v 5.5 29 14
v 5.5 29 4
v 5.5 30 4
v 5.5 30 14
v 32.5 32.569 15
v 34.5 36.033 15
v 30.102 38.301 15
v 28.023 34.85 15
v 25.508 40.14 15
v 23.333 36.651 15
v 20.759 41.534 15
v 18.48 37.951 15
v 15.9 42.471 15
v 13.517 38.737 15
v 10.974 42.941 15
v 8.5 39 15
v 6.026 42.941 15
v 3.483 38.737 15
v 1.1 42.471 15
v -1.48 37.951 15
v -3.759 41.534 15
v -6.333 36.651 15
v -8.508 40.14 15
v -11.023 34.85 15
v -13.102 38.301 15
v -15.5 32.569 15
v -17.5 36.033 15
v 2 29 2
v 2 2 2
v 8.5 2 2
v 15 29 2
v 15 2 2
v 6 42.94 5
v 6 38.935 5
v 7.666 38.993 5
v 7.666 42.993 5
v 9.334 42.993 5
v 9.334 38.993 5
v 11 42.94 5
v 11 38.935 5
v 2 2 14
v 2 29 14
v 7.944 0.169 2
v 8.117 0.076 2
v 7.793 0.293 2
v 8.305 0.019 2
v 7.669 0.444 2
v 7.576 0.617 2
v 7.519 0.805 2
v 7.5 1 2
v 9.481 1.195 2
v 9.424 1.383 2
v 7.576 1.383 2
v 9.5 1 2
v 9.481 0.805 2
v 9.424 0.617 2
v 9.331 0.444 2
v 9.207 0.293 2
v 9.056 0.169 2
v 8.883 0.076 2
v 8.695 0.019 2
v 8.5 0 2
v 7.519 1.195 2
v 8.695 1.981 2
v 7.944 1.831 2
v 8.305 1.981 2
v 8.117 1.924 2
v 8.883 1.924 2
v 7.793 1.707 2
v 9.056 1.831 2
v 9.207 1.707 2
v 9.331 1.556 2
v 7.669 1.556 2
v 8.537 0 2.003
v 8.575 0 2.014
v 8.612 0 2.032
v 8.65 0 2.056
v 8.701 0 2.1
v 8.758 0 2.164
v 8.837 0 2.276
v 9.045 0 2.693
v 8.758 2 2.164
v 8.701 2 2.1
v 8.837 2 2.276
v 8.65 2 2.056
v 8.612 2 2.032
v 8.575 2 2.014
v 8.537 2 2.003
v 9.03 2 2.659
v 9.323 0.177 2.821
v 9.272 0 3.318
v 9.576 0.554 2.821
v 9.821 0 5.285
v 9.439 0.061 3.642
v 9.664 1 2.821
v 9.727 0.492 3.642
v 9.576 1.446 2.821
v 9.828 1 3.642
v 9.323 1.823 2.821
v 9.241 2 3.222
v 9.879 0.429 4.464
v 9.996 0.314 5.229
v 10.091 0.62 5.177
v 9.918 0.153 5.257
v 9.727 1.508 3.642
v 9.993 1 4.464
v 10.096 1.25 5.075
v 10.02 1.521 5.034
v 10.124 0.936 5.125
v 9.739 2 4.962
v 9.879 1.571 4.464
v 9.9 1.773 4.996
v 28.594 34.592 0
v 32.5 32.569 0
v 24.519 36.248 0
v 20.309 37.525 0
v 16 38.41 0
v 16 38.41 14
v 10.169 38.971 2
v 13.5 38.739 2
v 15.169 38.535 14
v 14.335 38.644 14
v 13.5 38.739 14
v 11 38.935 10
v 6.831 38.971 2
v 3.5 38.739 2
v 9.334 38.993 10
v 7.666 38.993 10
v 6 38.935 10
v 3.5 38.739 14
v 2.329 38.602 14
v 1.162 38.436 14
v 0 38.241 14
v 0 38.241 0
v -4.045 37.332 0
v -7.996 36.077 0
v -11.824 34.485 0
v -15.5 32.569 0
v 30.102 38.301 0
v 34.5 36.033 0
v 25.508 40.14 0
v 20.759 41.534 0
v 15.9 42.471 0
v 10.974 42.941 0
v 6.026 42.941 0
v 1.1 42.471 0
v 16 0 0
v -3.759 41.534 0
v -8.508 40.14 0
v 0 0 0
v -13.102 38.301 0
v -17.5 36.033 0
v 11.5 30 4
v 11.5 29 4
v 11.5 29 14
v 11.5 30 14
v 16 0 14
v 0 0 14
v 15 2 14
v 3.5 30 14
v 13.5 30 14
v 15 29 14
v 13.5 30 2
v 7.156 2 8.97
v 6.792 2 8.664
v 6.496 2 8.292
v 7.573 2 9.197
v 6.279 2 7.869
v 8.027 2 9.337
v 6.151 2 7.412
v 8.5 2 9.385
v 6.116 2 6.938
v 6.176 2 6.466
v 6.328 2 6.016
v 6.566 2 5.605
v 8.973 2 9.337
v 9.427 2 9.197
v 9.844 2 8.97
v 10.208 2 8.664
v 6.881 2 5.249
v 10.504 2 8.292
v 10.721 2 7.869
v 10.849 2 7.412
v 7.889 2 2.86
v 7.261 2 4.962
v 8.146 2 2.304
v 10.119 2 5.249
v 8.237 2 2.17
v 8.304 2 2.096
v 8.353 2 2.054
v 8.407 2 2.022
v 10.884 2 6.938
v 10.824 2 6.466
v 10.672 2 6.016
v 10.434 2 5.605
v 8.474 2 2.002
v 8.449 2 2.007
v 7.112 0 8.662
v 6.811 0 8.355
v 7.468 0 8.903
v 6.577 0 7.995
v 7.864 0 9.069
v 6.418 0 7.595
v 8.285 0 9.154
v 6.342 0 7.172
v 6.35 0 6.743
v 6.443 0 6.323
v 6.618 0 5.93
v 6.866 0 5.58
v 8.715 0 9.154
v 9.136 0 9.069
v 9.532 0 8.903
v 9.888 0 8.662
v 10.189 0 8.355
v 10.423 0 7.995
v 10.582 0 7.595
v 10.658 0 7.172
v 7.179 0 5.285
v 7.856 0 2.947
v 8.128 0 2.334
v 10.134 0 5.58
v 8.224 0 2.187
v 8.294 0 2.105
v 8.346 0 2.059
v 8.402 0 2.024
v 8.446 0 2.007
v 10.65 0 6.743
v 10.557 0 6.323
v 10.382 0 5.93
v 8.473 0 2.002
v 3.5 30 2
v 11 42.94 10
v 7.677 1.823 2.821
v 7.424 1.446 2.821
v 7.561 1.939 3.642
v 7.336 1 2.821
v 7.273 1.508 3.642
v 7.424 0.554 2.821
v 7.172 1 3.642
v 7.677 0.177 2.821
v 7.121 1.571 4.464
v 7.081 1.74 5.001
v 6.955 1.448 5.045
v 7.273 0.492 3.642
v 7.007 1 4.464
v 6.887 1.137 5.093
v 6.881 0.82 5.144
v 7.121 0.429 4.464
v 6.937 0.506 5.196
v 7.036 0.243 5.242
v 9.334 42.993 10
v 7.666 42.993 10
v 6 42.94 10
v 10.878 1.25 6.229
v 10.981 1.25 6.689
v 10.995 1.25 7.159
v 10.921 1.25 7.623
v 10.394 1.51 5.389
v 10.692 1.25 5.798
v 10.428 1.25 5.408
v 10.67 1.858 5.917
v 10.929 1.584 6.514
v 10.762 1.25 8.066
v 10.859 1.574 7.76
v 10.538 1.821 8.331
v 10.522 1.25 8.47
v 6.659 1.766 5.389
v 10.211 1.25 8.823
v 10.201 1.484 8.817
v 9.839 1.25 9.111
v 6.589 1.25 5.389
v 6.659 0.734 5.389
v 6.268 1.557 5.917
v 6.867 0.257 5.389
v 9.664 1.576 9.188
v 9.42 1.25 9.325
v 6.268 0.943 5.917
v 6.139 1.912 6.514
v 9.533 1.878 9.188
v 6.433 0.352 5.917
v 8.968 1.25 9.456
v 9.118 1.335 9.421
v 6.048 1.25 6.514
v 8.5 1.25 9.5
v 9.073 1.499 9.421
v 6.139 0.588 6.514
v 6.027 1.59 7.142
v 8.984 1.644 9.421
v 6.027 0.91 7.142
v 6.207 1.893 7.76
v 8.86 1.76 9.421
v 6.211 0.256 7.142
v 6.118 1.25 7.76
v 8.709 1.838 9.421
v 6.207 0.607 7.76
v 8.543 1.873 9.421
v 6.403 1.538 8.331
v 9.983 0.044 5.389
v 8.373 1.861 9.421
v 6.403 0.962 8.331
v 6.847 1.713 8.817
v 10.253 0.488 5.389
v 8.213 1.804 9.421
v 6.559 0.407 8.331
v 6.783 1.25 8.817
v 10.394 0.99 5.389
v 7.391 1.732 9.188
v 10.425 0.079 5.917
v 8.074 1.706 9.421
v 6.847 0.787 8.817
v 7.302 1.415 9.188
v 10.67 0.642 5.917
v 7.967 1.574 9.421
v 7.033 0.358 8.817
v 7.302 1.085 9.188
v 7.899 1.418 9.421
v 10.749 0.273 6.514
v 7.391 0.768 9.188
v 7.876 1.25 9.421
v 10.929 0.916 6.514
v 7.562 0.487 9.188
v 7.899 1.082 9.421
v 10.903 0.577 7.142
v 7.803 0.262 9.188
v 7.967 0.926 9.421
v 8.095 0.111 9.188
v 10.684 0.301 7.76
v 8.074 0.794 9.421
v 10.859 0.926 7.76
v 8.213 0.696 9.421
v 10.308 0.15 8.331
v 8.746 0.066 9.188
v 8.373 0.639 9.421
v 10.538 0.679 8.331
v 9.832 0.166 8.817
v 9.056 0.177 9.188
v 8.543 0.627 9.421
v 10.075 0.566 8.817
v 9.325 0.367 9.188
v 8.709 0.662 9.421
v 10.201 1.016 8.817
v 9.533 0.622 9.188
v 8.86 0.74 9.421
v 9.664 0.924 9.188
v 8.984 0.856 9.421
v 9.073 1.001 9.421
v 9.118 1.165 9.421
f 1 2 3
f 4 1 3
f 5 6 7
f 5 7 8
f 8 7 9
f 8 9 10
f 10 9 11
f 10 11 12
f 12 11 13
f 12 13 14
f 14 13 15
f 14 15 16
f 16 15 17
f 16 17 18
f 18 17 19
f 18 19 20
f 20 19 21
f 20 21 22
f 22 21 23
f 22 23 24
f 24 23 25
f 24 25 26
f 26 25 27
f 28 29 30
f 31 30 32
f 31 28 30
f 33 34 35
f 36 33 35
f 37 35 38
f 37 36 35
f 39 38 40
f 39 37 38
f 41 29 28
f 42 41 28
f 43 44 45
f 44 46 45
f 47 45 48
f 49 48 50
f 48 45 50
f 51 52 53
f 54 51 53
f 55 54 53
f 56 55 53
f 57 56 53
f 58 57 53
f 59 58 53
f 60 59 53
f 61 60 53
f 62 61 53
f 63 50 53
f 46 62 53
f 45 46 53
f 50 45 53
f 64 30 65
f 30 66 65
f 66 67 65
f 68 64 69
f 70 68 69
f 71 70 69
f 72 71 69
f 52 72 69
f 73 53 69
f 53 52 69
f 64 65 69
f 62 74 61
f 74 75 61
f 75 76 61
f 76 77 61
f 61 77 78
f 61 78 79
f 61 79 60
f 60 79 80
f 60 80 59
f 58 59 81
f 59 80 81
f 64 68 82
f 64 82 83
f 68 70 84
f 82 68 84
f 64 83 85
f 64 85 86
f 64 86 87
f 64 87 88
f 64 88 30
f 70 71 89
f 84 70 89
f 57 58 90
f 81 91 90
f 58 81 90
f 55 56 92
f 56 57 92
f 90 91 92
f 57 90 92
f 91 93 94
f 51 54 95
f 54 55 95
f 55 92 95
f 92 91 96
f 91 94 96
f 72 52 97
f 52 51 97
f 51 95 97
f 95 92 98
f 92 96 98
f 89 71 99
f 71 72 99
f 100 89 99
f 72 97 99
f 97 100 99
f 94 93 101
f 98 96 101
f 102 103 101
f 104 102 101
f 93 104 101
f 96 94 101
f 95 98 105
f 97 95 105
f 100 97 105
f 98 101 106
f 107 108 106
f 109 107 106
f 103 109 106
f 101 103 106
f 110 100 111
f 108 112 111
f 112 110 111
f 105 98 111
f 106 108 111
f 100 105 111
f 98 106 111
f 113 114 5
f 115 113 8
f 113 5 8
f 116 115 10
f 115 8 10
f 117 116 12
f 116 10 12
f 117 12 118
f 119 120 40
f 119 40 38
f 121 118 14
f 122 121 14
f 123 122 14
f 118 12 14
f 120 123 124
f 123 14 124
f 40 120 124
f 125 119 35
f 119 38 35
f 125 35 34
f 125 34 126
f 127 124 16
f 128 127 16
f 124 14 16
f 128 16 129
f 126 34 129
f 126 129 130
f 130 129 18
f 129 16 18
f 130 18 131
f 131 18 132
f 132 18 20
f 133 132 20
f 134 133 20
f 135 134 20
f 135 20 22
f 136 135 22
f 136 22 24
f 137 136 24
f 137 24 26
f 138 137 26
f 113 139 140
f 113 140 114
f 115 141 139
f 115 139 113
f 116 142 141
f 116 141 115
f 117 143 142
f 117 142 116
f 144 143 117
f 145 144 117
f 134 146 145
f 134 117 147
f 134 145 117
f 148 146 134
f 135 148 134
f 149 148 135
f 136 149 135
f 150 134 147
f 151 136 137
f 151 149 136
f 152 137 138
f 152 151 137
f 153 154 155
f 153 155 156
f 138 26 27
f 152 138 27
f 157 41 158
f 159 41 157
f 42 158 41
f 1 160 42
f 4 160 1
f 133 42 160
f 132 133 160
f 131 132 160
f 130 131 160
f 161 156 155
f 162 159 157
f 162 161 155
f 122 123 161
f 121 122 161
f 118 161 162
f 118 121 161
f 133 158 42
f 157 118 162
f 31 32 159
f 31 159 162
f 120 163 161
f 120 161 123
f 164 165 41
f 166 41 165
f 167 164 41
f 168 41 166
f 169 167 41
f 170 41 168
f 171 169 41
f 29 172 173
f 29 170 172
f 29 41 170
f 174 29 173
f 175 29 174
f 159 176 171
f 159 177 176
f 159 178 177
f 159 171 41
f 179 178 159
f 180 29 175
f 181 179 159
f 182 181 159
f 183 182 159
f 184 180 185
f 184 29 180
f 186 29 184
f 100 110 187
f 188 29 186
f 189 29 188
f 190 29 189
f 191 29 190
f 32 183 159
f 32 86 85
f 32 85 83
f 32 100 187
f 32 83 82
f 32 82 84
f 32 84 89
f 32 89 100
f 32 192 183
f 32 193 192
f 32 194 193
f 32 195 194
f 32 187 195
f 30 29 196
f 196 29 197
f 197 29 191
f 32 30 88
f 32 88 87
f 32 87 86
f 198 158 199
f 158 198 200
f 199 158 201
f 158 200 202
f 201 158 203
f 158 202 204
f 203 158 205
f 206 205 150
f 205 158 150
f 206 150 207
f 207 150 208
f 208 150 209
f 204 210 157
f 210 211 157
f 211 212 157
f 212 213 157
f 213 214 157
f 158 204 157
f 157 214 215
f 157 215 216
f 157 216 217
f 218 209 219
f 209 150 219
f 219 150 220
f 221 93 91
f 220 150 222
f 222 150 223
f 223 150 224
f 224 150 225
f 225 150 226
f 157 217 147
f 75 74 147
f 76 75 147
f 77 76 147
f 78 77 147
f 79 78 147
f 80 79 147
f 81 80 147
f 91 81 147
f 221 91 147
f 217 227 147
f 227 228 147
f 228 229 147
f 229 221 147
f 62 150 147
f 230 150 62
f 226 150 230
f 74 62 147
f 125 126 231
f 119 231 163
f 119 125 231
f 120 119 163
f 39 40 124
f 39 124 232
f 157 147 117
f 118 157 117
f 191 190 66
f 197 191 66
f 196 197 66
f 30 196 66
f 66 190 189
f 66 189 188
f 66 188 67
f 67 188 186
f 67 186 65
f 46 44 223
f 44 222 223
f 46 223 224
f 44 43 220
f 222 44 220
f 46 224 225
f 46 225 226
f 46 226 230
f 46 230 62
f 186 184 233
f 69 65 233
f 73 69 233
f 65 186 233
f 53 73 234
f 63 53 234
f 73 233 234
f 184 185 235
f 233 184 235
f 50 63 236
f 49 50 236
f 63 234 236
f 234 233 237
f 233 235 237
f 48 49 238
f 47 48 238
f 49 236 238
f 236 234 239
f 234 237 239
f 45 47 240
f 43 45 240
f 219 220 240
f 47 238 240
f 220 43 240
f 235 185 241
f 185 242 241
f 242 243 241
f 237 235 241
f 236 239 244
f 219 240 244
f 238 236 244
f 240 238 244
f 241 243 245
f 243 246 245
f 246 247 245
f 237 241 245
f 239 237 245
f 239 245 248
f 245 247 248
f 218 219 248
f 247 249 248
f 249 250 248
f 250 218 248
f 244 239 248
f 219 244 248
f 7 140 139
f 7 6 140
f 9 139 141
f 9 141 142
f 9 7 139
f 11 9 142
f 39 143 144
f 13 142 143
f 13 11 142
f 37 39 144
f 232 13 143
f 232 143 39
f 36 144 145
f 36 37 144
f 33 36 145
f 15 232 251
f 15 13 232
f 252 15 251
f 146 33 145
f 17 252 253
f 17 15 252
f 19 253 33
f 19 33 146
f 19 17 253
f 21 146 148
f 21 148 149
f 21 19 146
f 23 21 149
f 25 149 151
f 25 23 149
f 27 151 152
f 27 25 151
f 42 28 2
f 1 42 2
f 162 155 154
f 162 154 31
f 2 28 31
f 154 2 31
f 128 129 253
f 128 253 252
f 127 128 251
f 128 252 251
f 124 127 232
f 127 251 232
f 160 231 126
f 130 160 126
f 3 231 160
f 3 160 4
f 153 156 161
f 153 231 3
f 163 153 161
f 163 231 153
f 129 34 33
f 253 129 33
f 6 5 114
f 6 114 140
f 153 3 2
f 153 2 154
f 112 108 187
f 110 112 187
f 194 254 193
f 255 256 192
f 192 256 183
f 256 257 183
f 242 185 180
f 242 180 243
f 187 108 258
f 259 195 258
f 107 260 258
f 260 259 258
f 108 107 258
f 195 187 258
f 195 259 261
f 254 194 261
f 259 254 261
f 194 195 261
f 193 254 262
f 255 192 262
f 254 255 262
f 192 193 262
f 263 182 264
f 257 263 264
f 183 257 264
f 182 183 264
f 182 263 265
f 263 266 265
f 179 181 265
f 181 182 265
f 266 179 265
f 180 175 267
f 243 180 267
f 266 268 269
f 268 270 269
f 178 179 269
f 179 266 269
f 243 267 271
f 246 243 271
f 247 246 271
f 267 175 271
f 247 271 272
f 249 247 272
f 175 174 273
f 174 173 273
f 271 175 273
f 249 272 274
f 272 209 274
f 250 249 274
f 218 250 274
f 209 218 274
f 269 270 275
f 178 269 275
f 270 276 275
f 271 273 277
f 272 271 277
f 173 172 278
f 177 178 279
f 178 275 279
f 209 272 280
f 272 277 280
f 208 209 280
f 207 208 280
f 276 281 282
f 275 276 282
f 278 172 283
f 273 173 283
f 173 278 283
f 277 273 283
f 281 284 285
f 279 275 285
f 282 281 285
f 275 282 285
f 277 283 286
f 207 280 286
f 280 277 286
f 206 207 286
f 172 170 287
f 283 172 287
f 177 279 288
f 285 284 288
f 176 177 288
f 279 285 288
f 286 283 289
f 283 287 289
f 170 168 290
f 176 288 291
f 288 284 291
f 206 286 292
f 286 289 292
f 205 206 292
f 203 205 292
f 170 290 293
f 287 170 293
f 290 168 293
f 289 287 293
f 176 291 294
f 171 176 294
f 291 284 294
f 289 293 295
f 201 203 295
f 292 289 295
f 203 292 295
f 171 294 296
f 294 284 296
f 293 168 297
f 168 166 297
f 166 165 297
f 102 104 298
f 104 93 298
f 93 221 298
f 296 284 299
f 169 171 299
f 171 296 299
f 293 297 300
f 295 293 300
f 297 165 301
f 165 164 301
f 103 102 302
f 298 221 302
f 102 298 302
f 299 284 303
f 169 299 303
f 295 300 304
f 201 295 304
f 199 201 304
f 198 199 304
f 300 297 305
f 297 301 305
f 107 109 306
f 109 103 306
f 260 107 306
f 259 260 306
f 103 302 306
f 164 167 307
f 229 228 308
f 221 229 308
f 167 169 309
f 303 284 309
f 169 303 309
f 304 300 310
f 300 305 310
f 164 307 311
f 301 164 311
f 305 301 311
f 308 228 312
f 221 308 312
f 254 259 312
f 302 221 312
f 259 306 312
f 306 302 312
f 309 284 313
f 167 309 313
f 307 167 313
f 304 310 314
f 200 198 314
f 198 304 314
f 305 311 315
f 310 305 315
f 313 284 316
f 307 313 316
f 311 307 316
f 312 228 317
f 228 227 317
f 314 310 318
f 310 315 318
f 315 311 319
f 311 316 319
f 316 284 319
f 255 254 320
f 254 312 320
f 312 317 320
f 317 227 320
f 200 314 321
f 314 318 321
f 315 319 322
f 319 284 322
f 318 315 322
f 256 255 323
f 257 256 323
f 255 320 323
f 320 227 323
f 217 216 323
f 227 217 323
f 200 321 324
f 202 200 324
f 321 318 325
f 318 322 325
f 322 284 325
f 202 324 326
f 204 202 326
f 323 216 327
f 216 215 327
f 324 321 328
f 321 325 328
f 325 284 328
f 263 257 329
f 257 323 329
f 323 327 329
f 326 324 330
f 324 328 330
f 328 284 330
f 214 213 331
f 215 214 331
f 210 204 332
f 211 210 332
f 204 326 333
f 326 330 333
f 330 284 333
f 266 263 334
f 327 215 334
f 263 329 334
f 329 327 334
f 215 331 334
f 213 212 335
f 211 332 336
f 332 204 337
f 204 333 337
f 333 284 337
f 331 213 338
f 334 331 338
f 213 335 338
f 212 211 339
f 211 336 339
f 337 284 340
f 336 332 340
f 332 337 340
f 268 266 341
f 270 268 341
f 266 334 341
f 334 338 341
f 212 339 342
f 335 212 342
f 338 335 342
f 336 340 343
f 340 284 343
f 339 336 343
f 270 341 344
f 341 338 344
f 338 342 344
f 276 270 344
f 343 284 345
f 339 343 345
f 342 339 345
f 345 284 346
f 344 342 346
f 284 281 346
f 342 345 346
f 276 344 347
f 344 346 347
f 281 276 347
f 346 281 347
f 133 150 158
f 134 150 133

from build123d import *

# Parameters (mm, degrees)
BOX004_W                    = 5
BOX004_H                    = 5
BOX004_DEPTH                = 5
CYLINDER001_W               = 48
CYLINDER001_H               = 15
CYLINDER001_ANGLE           = 60
CYLINDER001_PLACEMENT_ANGLE = 60
CYLINDER_W                  = 52
CYLINDER_H                  = 15
CYLINDER_ANGLE              = 60
CYLINDER_PLACEMENT_ANGLE    = 60
BOX003_W                    = 6
BOX003_H                    = 4
BOX003_DEPTH                = 15
BOX002_W                    = 10
BOX002_H                    = 10
BOX002_DEPTH                = 15
BOX001_W                    = 13
BOX001_H                    = 27
BOX001_DEPTH                = 12
BOX_W                       = 16
BOX_H                       = 40
BOX_DEPTH                   = 14


with BuildPart() as pin_opening:
    # Box004 → Box004 (new body)
    with BuildSketch(Plane(origin=(6, 38.5, 5), x_dir=(1, 0, 0), z_dir=(0, 0, 1))):
        with Locations((2.5, 2.5)):
            Rectangle(BOX004_W, BOX004_H)
    extrude(amount=BOX004_DEPTH)


with BuildPart() as bottle_wall001:
    # Cylinder001 → Cylinder001 (revolve)
    with BuildSketch(Plane.XZ):
        with Locations((24, 7.5)):
            Rectangle(CYLINDER001_W, CYLINDER001_H)
    revolve(axis=Axis((0, 0, 0), (0, 0, 1)), revolution_arc=CYLINDER001_ANGLE)


with BuildPart() as bottle_wall001_1:
    # Cylinder001 placement: moved
    add(bottle_wall001.part.moved(Location((8.5, -7, 0))).rotate(Axis((8.5, -7, 0), (0, 0, 1)), CYLINDER001_PLACEMENT_ANGLE))


with BuildPart() as cut005:
    # Cylinder → Cylinder (revolve)
    with BuildSketch(Plane.XZ):
        with Locations((26, 7.5)):
            Rectangle(CYLINDER_W, CYLINDER_H)
    revolve(axis=Axis((0, 0, 0), (0, 0, 1)), revolution_arc=CYLINDER_ANGLE)


with BuildPart() as cut005_1:
    # Cylinder placement: moved
    add(cut005.part.moved(Location((8.5, -7, 0))).rotate(Axis((8.5, -7, 0), (0, 0, 1)), CYLINDER_PLACEMENT_ANGLE))

    # Cut005: cut bottle_wall001
    add(bottle_wall001_1.part, mode=Mode.SUBTRACT)


with BuildPart() as cut005_2:
    # Cut005 placement: moved
    add(cut005_1.part.moved(Location((0, -2, 0))))


with BuildPart() as cone:
    # Cone → Cone (revolve)
    with BuildSketch(Plane(origin=(8.5, 1, 2), x_dir=(1, 0, 0), z_dir=(0, -1, 0))):
        Polygon((0, 0), (1, 0), (2, 5), (0, 5), align=None)
    revolve(axis=Axis((8.5, 1, 2), (0, 0, 1)))


with BuildPart() as pinhole:
    # Sphere → Sphere (revolve)
    with BuildSketch(Plane(origin=(8.5, 1.25, 7), x_dir=(1, 0, 0), z_dir=(0, -1, 0))):
        with BuildLine():
            ThreePointArc((0, -2.5), (2.5, 0), (0, 2.5))
            Line((0, 2.5), (0, -2.5))
        make_face()
    revolve(axis=Axis((8.5, 1.25, 7), (0, 0, 1)))


with BuildPart() as neck:
    # Box003 → Box003 (new body)
    with BuildSketch(Plane(origin=(5.5, 28, 4), x_dir=(1, 0, 0), z_dir=(0, 0, 1))):
        with Locations((3, 2)):
            Rectangle(BOX003_W, BOX003_H)
    extrude(amount=BOX003_DEPTH)


with BuildPart() as pullbay:
    # Box002 → Box002 (new body)
    with BuildSketch(Plane(origin=(3.5, 30, 2), x_dir=(1, 0, 0), z_dir=(0, 0, 1))):
        with Locations((5, 5)):
            Rectangle(BOX002_W, BOX002_H)
    extrude(amount=BOX002_DEPTH)


with BuildPart() as solenoidbay:
    # Box001 → Box001 (new body)
    with BuildSketch(Plane(origin=(2, 2, 2), x_dir=(1, 0, 0), z_dir=(0, 0, 1))):
        with Locations((6.5, 13.5)):
            Rectangle(BOX001_W, BOX001_H)
    extrude(amount=BOX001_DEPTH)


with BuildPart() as cut006:
    # Box → Box (new body)
    with BuildSketch(Plane.XY):
        with Locations((8, 20)):
            Rectangle(BOX_W, BOX_H)
    extrude(amount=BOX_DEPTH)

    # Cut: cut solenoidBay
    add(solenoidbay.part, mode=Mode.SUBTRACT)

    # Cut001: cut pullBay
    add(pullbay.part, mode=Mode.SUBTRACT)

    # Cut002: cut neck
    add(neck.part, mode=Mode.SUBTRACT)

    # Cut003: cut pinhole
    add(pinhole.part, mode=Mode.SUBTRACT)

    # Cut004: cut Cone
    add(cone.part, mode=Mode.SUBTRACT)

    # Fusion: union Cut005
    add(cut005_2.part)

    # Cut006: cut pin_opening
    add(pin_opening.part, mode=Mode.SUBTRACT)


solid = cut006.part
